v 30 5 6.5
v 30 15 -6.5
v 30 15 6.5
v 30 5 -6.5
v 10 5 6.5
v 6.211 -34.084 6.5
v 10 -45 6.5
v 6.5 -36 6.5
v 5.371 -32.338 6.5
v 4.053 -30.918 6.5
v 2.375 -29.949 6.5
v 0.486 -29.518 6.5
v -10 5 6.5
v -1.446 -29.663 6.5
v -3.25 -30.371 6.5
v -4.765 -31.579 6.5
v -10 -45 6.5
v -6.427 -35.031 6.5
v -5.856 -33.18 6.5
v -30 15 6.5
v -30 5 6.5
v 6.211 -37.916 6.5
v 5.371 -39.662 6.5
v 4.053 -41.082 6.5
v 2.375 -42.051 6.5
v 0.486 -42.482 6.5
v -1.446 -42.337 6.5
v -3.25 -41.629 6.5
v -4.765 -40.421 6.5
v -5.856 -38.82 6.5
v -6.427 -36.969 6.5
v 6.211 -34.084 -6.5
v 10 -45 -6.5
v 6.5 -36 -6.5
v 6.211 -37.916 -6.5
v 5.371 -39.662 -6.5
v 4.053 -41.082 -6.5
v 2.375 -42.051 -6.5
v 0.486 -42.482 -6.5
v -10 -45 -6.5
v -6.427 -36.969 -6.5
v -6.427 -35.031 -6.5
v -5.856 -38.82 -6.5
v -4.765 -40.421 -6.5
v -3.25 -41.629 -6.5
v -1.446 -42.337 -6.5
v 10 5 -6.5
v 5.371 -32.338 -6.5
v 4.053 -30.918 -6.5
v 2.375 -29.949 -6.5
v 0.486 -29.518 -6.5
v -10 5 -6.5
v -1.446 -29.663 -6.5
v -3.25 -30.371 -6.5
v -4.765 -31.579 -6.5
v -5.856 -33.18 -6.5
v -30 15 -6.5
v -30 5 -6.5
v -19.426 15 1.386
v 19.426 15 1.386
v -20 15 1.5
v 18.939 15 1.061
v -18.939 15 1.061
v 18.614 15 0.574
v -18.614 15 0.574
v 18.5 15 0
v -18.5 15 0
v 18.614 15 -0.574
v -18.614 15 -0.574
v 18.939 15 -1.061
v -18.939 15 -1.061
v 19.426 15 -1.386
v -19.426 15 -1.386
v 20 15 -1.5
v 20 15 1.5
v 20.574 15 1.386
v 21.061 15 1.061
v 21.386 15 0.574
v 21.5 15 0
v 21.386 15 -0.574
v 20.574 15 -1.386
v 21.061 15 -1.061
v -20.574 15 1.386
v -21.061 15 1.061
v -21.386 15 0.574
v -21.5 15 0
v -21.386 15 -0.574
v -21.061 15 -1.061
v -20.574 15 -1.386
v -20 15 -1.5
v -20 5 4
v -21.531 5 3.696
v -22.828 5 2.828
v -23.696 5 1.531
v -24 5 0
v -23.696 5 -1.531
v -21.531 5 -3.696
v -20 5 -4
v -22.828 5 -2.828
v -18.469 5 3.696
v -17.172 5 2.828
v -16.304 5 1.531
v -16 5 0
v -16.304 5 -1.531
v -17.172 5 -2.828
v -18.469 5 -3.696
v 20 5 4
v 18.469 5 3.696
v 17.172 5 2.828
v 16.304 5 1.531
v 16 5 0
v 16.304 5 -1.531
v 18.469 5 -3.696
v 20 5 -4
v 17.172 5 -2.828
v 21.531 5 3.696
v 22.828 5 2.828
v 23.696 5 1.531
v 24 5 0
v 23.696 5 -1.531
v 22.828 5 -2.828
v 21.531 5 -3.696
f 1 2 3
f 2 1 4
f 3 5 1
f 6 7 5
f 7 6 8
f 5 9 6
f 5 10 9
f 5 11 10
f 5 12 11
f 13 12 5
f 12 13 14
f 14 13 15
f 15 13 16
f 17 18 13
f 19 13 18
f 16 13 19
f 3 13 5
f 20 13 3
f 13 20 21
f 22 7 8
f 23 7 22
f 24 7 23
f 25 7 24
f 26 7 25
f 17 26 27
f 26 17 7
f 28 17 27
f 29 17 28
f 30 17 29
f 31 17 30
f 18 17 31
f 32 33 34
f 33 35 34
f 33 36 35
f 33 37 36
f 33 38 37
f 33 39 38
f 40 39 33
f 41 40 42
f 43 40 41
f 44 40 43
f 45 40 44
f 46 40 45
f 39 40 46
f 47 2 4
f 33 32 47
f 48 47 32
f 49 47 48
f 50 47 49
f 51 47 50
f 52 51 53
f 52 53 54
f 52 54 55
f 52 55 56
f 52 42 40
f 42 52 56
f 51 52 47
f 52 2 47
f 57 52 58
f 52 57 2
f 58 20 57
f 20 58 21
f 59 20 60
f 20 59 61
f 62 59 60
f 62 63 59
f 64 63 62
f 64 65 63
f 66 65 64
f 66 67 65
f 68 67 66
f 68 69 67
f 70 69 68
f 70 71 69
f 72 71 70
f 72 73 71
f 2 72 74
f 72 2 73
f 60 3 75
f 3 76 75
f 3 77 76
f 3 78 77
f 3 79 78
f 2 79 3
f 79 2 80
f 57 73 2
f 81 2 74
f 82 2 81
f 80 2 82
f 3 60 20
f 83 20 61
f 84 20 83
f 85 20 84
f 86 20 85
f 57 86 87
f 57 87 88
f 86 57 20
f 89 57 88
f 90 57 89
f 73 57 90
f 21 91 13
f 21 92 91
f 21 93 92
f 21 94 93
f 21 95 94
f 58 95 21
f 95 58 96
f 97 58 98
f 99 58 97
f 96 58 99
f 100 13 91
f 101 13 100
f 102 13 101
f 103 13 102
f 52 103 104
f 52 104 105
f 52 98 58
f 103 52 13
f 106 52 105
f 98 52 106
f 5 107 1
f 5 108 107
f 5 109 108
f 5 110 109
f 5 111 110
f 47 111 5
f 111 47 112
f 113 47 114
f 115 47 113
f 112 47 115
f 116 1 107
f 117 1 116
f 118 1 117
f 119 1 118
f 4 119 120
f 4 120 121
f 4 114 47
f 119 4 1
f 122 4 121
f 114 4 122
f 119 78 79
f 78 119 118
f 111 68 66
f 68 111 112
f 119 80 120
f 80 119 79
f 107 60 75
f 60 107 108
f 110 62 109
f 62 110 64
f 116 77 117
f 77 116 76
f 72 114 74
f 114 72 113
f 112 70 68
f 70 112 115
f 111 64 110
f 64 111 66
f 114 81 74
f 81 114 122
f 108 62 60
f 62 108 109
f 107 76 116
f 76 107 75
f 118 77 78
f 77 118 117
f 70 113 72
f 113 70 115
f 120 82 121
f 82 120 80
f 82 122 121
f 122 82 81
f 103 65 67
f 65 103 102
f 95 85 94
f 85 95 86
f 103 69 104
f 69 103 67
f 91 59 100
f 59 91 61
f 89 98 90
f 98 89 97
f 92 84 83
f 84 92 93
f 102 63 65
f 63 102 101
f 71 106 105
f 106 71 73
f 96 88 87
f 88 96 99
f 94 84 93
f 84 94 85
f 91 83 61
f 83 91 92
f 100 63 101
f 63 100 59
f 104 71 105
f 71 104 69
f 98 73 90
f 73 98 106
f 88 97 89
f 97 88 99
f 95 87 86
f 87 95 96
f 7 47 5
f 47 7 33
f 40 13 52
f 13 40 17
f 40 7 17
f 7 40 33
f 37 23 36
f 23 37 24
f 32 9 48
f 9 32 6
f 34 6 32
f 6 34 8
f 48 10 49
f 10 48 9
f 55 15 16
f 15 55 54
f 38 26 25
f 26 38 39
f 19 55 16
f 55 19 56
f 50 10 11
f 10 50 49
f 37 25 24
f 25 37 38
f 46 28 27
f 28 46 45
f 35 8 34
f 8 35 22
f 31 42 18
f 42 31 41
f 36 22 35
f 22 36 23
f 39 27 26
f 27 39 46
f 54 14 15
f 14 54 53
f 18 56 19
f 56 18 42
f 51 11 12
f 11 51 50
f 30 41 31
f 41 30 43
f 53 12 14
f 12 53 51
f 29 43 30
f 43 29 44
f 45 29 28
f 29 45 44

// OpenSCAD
difference(){
translate([0,10,0]) cube([60,10,13], true);
translate([20,11,0]) rotate([90,0,0]) cylinder(20,0, 5, center=true);
    translate([-20,11,0]) rotate([90,0,0]) cylinder(20,0, 5, center=true);
}

translate([0,-20,0]) difference(){
 
 
 cube([20,50,13], true);
  translate([0,-16,0])  cylinder(d=13, h=40, center=true);
}
